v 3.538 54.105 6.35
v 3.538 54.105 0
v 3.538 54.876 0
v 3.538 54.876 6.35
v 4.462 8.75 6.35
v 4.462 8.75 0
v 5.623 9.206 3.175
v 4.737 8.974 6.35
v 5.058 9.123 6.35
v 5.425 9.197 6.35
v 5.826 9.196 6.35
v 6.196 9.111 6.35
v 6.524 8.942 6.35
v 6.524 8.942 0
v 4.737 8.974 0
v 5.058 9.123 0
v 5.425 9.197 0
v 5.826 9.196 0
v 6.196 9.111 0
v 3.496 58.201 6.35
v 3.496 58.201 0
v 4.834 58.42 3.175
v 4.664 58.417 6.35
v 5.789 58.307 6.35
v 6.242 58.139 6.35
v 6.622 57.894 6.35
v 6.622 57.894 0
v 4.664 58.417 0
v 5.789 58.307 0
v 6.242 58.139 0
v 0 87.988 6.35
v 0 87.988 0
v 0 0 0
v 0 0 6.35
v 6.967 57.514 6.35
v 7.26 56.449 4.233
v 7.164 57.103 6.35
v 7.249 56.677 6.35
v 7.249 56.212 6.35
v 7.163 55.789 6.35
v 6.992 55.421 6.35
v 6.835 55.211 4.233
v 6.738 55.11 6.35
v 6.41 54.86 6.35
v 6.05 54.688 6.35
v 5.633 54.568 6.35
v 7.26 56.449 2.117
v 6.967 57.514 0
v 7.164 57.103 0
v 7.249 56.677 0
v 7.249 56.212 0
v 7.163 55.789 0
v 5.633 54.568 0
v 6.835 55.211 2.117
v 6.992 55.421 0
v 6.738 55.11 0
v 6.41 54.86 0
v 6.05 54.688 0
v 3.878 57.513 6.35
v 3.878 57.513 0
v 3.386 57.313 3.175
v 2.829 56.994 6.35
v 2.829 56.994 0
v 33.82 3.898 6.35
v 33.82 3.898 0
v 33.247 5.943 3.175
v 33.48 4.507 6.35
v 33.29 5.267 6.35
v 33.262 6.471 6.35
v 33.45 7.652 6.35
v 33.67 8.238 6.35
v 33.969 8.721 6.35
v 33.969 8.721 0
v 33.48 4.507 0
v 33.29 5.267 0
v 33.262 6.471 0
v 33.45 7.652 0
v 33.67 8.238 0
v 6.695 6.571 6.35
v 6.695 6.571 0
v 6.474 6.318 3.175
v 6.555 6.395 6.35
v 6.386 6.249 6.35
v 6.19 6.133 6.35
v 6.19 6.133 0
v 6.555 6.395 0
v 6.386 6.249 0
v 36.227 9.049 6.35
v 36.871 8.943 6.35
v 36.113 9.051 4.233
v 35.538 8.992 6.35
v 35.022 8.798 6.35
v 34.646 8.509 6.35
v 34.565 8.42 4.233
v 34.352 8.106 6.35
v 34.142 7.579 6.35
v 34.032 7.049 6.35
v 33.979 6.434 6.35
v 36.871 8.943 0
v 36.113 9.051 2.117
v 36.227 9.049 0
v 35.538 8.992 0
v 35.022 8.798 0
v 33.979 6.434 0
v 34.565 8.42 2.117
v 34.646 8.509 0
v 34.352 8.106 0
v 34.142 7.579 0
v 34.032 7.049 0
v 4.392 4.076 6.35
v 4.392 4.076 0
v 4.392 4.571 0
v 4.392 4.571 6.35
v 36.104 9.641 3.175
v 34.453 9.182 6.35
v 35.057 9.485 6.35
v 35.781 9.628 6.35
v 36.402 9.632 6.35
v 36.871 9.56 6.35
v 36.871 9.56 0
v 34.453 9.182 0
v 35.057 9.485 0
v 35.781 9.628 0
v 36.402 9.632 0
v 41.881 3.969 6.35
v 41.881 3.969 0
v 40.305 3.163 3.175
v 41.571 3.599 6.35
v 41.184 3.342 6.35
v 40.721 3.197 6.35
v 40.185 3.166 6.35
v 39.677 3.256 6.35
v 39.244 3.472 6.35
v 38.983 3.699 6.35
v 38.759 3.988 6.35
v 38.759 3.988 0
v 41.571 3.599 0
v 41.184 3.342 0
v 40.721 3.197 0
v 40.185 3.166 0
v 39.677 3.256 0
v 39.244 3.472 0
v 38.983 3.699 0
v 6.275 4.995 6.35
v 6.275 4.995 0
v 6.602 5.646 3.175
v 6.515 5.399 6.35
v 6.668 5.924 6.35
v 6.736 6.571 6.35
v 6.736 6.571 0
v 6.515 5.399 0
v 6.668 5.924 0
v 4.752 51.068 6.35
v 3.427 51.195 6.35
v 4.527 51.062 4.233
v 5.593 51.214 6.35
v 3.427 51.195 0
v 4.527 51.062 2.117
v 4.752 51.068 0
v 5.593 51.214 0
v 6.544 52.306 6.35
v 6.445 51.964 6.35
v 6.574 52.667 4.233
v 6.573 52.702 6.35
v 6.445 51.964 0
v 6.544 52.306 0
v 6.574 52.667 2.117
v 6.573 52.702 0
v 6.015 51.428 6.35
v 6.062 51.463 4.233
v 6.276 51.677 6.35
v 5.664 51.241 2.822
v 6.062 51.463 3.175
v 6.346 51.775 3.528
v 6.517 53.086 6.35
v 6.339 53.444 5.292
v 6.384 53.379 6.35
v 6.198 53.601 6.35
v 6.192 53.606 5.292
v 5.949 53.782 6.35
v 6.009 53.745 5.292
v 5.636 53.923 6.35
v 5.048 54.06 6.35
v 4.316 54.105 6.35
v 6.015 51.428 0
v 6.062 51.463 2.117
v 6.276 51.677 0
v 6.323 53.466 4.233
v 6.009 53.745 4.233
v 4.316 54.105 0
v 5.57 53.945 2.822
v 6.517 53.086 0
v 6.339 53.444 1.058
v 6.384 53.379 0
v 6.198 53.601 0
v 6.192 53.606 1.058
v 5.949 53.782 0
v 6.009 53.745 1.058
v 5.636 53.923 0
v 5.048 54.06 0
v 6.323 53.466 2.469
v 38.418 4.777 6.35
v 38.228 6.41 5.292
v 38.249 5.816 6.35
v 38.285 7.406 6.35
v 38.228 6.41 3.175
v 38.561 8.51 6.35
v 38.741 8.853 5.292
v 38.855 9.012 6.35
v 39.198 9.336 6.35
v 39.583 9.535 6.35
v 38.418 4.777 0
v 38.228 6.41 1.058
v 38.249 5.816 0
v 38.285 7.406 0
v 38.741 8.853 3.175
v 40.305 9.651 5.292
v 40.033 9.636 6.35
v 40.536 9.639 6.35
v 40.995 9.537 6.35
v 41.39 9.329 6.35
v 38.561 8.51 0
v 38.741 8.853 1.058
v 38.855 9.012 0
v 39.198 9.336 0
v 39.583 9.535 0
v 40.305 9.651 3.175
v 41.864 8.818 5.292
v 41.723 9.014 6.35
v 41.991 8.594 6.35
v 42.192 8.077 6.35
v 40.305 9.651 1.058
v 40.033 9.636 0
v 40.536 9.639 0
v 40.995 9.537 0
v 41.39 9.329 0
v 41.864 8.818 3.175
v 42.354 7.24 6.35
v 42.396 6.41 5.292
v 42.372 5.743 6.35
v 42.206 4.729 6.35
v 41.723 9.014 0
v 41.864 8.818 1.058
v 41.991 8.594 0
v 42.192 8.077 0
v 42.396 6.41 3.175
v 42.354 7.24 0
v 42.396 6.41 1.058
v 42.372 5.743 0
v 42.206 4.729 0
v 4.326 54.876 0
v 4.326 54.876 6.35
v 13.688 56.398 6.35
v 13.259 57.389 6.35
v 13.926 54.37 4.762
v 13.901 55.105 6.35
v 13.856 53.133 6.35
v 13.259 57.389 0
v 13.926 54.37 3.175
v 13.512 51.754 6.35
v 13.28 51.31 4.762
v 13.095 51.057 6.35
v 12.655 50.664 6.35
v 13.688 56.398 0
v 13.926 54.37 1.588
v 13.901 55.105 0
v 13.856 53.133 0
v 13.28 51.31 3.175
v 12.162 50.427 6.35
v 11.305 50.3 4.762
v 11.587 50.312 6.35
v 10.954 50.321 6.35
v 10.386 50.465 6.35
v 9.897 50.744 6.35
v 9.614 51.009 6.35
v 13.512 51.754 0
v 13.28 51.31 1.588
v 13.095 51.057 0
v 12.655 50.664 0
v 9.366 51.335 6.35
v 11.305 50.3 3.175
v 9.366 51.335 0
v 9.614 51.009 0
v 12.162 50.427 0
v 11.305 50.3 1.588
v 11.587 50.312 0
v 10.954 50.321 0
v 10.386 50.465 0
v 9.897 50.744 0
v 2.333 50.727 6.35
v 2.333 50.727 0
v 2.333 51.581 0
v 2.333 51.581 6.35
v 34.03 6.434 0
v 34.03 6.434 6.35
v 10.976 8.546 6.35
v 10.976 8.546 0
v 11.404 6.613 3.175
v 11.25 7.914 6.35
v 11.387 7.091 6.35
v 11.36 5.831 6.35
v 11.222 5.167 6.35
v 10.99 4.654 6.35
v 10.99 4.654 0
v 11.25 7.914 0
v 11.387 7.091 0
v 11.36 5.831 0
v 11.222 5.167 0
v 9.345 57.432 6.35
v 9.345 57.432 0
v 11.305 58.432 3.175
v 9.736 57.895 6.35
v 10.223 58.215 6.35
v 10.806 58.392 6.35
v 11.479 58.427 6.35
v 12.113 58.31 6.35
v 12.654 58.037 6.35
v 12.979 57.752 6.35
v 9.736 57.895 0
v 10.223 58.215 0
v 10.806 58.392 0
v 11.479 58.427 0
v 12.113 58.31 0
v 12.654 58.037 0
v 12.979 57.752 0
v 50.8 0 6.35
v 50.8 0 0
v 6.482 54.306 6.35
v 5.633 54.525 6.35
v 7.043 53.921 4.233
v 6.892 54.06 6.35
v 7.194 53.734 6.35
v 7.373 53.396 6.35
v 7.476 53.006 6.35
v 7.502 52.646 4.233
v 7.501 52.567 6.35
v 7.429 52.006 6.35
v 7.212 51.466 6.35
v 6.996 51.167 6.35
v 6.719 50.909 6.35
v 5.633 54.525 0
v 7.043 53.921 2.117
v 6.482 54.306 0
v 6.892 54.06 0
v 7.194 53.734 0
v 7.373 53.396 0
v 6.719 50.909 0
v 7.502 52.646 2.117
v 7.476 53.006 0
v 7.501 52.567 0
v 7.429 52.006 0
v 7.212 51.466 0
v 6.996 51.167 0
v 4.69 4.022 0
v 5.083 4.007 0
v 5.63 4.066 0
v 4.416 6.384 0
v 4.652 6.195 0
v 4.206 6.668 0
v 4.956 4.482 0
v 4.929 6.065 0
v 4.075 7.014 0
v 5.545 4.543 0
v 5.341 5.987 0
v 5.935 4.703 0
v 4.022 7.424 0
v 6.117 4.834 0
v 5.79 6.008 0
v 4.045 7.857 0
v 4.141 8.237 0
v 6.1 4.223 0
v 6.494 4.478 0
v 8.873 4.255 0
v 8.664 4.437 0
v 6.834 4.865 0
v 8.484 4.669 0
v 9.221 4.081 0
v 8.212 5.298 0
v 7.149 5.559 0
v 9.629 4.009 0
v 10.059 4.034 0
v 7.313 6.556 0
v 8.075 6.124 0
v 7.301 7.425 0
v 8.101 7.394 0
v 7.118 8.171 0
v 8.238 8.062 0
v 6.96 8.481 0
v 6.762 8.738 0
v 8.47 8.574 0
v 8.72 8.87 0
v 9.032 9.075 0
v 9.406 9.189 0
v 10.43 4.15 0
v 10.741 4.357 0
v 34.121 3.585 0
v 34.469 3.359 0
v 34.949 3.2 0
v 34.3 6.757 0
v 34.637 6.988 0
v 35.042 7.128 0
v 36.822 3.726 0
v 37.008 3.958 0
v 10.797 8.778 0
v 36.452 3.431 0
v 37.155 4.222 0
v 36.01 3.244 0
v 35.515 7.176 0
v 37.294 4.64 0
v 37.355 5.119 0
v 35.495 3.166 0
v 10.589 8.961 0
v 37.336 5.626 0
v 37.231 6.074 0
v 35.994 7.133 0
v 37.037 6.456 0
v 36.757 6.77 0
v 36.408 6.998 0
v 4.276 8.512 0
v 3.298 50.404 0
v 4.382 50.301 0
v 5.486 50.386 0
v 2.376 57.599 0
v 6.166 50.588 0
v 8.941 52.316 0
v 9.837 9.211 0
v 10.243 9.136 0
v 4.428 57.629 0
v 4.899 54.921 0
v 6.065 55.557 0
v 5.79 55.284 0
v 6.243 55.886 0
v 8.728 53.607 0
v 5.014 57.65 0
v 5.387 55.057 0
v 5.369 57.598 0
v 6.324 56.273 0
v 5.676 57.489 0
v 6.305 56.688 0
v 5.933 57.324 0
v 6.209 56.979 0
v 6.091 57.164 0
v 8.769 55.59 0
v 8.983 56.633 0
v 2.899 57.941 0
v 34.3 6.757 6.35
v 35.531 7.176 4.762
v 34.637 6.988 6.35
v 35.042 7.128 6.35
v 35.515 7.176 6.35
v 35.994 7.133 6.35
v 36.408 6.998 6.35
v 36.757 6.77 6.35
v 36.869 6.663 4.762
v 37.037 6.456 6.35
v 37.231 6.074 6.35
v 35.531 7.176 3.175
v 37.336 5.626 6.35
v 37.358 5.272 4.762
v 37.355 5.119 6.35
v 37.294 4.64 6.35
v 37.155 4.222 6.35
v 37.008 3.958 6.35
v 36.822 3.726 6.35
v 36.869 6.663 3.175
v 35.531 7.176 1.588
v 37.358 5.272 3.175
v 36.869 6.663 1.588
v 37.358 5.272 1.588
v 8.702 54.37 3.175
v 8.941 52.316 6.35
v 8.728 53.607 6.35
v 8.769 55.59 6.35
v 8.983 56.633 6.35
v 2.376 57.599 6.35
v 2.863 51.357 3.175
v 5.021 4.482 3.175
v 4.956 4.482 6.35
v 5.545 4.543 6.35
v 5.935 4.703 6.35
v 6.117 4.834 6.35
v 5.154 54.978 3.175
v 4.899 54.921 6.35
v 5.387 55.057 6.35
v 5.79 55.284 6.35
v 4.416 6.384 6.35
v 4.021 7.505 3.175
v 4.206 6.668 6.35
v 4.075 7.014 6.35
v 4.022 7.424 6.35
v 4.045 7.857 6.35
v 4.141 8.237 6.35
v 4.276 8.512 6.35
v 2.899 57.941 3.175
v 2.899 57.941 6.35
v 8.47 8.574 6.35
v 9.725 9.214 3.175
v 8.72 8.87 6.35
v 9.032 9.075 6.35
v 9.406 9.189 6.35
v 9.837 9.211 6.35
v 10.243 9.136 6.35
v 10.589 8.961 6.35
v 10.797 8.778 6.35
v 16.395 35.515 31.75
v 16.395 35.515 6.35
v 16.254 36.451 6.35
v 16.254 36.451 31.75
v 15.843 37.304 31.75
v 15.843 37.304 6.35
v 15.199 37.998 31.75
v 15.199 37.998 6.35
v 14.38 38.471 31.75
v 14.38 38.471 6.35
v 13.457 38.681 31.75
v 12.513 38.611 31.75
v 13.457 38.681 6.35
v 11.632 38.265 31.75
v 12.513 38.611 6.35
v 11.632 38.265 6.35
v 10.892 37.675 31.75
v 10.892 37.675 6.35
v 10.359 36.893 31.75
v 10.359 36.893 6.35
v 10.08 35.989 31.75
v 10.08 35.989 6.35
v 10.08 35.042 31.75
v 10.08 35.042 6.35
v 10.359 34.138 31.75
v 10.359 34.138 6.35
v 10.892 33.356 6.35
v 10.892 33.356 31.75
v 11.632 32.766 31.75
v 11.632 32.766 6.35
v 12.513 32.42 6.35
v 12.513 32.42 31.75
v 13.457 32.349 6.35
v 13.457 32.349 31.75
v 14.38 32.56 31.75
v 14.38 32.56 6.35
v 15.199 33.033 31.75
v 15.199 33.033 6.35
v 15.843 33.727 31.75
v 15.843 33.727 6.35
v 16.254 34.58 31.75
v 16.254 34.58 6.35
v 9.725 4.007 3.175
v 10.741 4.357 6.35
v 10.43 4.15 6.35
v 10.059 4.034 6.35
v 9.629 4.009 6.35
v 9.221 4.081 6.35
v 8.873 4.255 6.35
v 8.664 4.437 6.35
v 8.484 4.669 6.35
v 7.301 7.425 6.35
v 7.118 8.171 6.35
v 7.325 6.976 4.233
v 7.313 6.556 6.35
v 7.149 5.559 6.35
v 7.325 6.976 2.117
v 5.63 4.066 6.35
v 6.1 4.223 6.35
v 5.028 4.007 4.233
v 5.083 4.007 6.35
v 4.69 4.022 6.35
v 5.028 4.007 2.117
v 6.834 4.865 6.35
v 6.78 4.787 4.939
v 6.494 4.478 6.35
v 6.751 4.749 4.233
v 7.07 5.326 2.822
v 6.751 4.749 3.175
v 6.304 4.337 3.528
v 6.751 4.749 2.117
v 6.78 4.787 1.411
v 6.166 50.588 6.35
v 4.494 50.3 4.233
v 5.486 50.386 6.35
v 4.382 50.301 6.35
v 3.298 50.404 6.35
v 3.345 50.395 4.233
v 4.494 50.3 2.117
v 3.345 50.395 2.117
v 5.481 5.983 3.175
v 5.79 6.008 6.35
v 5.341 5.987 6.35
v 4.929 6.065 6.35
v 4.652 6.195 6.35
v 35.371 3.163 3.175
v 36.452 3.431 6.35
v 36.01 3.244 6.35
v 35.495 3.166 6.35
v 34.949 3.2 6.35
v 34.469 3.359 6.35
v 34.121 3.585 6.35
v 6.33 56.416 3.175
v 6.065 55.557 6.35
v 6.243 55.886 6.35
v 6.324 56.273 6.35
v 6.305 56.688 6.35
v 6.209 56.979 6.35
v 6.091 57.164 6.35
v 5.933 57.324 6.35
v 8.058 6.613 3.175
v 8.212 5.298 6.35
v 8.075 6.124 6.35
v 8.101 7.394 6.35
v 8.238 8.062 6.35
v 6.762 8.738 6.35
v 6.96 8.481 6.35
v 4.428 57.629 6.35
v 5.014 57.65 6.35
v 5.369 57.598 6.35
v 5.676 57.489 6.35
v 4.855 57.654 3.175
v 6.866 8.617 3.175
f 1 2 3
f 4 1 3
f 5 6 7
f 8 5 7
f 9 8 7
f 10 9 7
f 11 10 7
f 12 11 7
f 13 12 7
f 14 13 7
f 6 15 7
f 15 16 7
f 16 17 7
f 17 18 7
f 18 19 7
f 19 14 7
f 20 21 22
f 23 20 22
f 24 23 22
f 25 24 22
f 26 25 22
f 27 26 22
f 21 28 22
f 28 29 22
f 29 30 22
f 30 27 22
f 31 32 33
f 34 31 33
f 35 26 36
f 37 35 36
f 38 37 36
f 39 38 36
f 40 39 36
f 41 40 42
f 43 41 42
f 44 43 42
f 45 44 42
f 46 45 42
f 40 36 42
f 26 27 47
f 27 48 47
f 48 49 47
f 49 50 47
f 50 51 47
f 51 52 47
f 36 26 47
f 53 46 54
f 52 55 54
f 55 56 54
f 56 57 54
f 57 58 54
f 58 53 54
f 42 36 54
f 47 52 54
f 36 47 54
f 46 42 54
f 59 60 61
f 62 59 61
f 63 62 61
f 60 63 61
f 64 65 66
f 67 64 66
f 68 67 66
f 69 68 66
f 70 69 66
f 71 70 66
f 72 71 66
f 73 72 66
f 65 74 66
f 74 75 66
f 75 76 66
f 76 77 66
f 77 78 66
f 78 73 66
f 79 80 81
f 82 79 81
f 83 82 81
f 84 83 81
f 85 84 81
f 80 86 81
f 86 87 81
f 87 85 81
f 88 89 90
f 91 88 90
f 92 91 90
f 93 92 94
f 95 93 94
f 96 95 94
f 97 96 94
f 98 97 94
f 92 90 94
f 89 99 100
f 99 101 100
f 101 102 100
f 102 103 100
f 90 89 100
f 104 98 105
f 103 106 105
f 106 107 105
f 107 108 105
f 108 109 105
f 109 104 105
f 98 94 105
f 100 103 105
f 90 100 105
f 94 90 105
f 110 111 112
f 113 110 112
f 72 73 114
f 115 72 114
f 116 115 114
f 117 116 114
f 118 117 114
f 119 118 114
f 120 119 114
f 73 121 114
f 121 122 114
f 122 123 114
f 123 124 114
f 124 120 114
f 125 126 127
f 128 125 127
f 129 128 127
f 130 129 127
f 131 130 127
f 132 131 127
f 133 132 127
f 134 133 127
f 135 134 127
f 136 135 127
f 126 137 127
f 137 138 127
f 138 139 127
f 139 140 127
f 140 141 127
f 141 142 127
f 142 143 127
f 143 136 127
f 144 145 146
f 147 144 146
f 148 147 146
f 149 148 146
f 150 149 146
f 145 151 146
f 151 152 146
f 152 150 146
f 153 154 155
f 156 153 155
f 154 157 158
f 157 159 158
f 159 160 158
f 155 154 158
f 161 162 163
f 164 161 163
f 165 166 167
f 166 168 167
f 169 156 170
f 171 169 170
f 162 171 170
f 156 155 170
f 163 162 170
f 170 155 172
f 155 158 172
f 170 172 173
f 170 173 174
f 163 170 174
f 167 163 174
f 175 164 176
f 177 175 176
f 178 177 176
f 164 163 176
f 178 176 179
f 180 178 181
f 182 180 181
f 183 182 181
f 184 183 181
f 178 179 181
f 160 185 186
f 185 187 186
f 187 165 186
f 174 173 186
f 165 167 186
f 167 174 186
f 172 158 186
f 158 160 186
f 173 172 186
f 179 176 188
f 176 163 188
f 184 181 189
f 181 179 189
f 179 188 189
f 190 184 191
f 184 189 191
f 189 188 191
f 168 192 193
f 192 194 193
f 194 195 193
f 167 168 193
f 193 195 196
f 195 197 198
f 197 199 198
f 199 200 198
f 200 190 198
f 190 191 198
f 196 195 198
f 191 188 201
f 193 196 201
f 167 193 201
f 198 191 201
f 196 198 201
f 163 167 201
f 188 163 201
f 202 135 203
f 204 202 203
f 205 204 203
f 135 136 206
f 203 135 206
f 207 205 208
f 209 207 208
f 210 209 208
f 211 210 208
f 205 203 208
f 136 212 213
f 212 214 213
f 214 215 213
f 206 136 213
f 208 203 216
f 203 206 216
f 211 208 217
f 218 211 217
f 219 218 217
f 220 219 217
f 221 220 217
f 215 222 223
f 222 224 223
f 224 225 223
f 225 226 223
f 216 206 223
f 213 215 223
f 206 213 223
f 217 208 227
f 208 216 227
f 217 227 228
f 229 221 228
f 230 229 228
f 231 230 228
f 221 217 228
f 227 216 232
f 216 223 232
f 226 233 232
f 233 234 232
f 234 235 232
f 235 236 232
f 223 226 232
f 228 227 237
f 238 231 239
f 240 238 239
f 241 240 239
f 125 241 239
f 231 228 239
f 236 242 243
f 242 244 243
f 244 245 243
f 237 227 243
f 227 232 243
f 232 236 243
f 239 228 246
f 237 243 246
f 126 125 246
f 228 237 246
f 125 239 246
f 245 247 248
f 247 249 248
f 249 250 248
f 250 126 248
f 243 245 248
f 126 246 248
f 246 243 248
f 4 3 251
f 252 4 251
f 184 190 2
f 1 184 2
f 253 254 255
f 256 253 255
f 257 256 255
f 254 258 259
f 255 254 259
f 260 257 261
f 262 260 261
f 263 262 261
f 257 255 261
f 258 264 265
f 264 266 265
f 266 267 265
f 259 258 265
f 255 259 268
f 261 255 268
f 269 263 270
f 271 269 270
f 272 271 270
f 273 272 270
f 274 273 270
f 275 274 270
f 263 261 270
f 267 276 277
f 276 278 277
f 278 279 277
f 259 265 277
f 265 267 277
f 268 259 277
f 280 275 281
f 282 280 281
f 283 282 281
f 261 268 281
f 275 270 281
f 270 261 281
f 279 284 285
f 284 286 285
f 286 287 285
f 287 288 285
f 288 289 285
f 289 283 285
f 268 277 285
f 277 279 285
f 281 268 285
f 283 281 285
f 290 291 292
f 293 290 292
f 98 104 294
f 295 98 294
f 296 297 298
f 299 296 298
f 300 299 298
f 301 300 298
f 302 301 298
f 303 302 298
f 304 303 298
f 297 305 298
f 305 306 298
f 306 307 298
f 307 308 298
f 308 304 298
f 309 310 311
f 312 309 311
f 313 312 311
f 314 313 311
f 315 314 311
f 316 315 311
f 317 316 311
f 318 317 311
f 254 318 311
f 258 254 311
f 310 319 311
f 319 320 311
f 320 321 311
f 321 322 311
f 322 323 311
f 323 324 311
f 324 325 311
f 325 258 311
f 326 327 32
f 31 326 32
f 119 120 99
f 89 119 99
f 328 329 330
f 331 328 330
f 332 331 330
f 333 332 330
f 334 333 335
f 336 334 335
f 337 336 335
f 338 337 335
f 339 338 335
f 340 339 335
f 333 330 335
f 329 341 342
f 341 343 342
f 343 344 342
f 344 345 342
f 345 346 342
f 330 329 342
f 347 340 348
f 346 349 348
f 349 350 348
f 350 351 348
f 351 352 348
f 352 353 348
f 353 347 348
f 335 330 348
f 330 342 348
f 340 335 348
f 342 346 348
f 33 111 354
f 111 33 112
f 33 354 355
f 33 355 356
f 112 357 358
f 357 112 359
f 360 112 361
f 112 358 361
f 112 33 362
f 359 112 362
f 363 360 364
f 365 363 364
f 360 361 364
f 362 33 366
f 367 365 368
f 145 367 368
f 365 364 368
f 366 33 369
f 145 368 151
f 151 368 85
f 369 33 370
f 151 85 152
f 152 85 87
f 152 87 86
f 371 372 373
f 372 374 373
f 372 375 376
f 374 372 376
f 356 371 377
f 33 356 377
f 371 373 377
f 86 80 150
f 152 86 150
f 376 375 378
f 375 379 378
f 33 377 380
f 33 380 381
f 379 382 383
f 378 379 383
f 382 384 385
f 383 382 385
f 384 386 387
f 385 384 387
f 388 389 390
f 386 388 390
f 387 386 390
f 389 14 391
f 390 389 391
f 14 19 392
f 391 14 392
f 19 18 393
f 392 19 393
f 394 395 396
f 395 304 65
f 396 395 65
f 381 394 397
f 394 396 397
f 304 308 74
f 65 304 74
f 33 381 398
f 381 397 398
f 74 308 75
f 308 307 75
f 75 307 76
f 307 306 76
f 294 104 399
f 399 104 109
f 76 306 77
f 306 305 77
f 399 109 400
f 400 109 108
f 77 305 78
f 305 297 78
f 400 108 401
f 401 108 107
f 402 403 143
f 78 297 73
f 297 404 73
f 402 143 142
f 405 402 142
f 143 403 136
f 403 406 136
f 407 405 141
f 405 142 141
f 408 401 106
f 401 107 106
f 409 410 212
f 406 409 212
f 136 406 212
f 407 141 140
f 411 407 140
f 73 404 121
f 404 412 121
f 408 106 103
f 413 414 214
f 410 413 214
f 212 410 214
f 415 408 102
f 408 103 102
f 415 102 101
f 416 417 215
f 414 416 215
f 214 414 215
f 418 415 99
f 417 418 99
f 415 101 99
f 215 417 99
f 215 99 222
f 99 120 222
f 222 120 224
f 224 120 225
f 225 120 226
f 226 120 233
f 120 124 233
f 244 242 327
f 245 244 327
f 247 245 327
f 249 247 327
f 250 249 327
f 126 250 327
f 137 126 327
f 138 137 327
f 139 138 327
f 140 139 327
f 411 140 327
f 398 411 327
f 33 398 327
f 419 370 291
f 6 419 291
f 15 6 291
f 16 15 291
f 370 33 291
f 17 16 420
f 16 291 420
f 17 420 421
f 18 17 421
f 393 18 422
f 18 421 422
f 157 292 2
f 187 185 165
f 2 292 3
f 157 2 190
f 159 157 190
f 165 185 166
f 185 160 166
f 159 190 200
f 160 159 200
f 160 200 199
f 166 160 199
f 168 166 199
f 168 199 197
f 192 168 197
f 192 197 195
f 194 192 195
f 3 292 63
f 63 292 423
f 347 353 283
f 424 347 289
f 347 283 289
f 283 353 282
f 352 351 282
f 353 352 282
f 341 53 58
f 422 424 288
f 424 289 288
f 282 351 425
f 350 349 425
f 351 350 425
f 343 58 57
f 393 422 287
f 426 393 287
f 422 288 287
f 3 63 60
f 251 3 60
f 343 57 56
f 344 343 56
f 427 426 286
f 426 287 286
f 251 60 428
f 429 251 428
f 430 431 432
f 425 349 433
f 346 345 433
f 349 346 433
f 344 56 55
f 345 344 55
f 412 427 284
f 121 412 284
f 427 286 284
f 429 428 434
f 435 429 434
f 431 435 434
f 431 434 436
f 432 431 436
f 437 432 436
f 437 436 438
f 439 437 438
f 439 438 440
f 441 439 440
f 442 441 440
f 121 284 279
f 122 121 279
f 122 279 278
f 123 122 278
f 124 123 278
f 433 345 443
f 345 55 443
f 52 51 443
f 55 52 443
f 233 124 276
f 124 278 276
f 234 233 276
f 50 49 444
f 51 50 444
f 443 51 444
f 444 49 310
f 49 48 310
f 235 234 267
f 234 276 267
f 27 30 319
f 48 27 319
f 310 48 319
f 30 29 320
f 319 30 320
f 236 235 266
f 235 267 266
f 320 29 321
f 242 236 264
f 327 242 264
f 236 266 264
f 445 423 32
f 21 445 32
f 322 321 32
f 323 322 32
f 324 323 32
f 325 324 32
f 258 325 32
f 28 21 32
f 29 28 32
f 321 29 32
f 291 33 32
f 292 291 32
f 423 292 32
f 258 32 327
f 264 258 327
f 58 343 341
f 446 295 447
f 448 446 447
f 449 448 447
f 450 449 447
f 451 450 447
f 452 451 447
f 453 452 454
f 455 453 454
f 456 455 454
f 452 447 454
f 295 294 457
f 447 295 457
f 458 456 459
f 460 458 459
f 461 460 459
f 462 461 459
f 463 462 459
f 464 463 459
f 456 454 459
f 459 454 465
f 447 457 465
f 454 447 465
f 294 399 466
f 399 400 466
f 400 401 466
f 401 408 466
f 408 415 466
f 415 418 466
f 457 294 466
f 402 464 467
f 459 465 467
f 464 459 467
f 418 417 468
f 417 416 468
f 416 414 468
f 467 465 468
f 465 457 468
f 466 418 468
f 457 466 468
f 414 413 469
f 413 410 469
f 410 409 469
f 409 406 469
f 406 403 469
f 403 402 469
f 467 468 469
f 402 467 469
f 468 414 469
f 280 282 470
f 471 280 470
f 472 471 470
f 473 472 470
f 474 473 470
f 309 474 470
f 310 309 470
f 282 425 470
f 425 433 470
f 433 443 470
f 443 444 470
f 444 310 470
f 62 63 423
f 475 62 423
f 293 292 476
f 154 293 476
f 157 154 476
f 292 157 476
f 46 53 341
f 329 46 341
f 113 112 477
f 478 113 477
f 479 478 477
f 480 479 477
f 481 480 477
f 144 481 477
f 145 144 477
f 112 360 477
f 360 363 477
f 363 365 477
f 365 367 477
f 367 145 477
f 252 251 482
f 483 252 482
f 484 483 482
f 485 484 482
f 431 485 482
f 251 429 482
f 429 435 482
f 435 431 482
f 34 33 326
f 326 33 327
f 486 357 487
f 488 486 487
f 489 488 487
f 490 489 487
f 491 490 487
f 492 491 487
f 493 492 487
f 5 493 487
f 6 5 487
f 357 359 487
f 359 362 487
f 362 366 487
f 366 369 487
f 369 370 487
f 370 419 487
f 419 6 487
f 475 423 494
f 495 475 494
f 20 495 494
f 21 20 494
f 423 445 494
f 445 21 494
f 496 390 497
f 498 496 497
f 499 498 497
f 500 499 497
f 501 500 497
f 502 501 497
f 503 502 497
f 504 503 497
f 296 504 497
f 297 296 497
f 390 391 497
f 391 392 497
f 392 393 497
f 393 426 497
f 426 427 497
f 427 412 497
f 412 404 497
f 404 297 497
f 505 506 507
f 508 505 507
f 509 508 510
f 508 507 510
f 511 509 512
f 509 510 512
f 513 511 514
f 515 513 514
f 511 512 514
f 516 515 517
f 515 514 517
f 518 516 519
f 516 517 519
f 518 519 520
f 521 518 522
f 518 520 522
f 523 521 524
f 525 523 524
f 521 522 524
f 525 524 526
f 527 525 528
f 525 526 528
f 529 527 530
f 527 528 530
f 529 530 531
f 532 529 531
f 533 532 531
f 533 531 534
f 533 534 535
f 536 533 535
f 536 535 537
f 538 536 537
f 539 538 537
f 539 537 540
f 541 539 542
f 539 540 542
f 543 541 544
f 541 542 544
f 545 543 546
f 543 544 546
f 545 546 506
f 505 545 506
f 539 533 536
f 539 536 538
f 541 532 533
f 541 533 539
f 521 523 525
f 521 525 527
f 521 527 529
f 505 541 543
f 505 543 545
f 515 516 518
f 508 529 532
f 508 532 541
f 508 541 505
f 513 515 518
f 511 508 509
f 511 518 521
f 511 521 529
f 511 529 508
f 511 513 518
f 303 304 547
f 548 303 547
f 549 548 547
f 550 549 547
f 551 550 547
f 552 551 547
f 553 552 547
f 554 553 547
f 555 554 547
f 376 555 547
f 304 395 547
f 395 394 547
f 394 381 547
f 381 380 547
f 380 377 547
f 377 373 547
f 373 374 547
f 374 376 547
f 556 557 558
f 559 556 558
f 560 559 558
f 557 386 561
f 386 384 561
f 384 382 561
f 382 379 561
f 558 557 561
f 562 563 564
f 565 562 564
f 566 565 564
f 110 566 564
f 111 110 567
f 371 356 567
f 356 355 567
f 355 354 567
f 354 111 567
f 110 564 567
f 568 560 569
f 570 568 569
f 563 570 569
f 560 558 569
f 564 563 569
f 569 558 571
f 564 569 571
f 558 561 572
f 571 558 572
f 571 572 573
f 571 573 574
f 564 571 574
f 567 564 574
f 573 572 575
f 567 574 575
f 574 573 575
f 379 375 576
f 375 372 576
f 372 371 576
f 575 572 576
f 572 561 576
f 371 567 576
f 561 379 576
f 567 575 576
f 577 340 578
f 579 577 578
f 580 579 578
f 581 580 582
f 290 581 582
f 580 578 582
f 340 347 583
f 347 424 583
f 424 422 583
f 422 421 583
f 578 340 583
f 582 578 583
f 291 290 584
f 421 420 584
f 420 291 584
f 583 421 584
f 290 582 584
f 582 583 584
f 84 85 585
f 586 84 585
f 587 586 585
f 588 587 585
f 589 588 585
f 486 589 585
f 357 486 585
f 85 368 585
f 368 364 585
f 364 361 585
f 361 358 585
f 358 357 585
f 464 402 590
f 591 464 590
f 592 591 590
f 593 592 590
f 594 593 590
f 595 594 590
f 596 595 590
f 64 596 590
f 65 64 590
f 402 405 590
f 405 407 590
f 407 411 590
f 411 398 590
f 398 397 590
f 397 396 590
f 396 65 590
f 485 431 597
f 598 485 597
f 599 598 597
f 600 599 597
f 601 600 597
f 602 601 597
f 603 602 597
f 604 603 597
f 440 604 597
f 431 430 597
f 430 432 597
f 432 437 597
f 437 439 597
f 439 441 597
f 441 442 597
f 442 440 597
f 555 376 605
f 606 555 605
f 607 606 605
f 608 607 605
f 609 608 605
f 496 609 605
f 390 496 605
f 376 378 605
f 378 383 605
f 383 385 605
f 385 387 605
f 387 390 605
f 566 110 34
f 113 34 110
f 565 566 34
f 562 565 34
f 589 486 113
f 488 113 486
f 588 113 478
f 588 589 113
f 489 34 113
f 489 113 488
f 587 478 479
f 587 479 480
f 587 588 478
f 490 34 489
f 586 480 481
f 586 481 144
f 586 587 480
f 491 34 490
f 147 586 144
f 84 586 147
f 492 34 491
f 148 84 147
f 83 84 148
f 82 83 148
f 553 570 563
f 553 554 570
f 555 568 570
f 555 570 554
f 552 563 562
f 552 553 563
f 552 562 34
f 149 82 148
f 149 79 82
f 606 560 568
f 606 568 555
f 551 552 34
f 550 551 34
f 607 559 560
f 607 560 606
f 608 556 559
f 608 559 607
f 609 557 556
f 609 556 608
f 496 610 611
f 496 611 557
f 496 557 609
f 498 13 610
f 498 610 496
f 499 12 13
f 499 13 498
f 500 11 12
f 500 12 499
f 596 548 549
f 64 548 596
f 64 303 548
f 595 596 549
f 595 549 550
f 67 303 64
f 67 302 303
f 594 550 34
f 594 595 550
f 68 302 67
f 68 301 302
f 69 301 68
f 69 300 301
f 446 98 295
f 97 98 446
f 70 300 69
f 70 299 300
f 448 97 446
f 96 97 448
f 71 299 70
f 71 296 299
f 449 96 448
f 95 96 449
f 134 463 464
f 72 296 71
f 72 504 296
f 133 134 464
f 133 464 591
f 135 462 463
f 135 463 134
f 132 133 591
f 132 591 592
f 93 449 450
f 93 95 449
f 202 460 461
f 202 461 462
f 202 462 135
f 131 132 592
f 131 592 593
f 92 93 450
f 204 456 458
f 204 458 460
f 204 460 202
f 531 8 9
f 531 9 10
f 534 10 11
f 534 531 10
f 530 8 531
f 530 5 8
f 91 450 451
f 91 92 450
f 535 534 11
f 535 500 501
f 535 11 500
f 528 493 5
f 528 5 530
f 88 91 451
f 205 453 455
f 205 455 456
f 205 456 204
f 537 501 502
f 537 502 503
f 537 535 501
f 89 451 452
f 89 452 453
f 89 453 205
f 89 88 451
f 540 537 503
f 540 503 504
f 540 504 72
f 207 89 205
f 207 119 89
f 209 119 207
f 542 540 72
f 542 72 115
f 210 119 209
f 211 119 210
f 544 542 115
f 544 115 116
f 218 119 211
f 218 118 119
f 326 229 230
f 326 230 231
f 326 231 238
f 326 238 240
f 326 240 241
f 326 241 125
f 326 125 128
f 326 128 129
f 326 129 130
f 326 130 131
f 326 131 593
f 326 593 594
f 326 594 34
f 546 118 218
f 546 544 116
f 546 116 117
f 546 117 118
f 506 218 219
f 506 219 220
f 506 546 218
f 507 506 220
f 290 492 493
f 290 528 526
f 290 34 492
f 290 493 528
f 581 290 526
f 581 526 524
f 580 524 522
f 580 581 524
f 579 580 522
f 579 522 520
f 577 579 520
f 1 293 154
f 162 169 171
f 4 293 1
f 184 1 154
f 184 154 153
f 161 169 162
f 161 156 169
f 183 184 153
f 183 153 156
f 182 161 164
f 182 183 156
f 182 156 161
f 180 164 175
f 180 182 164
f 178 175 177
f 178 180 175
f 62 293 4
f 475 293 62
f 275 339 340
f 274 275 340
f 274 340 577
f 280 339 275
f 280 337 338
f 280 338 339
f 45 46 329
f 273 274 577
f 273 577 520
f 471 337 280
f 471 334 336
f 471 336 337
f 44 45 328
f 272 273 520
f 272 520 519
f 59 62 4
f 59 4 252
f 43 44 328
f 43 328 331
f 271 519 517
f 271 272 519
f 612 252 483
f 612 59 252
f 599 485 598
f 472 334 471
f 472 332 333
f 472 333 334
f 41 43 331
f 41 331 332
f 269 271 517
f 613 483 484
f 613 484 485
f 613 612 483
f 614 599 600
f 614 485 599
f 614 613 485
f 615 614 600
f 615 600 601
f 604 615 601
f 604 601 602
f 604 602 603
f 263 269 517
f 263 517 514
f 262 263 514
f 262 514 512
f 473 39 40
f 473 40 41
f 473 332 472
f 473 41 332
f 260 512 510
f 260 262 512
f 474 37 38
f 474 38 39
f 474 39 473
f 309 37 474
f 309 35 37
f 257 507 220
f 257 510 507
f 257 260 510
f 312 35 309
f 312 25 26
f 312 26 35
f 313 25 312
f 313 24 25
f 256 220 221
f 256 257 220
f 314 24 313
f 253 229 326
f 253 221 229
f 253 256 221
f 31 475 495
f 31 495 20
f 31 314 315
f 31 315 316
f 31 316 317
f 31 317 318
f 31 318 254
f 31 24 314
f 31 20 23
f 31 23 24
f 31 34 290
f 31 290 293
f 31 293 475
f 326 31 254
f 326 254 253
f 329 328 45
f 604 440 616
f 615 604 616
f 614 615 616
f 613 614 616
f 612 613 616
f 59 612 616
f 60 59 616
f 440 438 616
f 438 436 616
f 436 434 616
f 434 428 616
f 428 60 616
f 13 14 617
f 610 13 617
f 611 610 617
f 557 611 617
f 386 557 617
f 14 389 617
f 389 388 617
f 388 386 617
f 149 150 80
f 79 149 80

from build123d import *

# Parameters (mm, degrees)
F1_DEPTH = 6.35
F2_R     = 3.175
F3_DEPTH = 25.4


with BuildPart() as f1:
    # F0 (on Top) → F1 (new body)
    with BuildSketch(Plane.XY):
        Polygon((0, 87.9881810245), (0, 0), (50.8, 0), align=None)
        with BuildLine():
            add(Edge.make_bspline(
                [(7.1177864202, 8.1707244078), (7.3253515095, 7.66426559), (7.3253515095, 6.9757030005)],
                knots=[0, 0, 0, 1, 1, 1], degree=2))
            add(Edge.make_bspline(
                [(7.3253515095, 6.9757030005), (7.3253515095, 4.0066919637), (5.028297855, 4.0066919637)],
                knots=[0, 0, 0, 1, 1, 1], degree=2))
            add(Edge.make_bspline(
                [(5.028297855, 4.0066919637), (4.6264518421, 4.0066919637), (4.3917649145, 4.0764338337)],
                knots=[0, 0, 0, 1, 1, 1], degree=2))
            Line((4.3917649145, 4.0764338337), (4.3917649145, 4.5712690065))
            add(Edge.make_bspline(
                [(4.3917649145, 4.5712690065), (4.6685183669, 4.4816008879), (5.0205487583, 4.4816008879)],
                knots=[0, 0, 0, 1, 1, 1], degree=2))
            add(Edge.make_bspline(
                [(5.0205487583, 4.4816008879), (5.8508091153, 4.4816008879), (6.2747954044, 4.9952552955)],
                knots=[0, 0, 0, 1, 1, 1], degree=2))
            add(Edge.make_bspline(
                [(6.2747954044, 4.9952552955), (6.6987816934, 5.5089097031), (6.7364201629, 6.5705359463)],
                knots=[0, 0, 0, 1, 1, 1], degree=2))
            Line((6.7364201629, 6.5705359463), (6.6954606519, 6.5705359463))
            add(Edge.make_bspline(
                [(6.6954606519, 6.5705359463), (6.5050542767, 6.2838193697), (6.1901088479, 6.1332654916)],
                knots=[0, 0, 0, 1, 1, 1], degree=2))
            add(Edge.make_bspline(
                [(6.1901088479, 6.1332654916), (5.8751634192, 5.9827116135), (5.481066503, 5.9827116135)],
                knots=[0, 0, 0, 1, 1, 1], degree=2))
            add(Edge.make_bspline(
                [(5.481066503, 5.9827116135), (4.8102161345, 5.9827116135), (4.4155657114, 6.3840041194)],
                knots=[0, 0, 0, 1, 1, 1], degree=2))
            add(Edge.make_bspline(
                [(4.4155657114, 6.3840041194), (4.0209152884, 6.7852966253), (4.0209152884, 7.5048556014)],
                knots=[0, 0, 0, 1, 1, 1], degree=2))
            add(Edge.make_bspline(
                [(4.0209152884, 7.5048556014), (4.0209152884, 8.2930494337), (4.4620602914, 8.7496926301)],
                knots=[0, 0, 0, 1, 1, 1], degree=2))
            add(Edge.make_bspline(
                [(4.4620602914, 8.7496926301), (4.9032052945, 9.2063358265), (5.6227642706, 9.2063358265)],
                knots=[0, 0, 0, 1, 1, 1], degree=2))
            add(Edge.make_bspline(
                [(5.6227642706, 9.2063358265), (6.1386327058, 9.2063358265), (6.5244270184, 8.941759526)],
                knots=[0, 0, 0, 1, 1, 1], degree=2))
            add(Edge.make_bspline(
                [(6.5244270184, 8.941759526), (6.910221331, 8.6771832256), (7.1177864202, 8.1707244078)],
                knots=[0, 0, 0, 1, 1, 1], degree=2))
        make_face(mode=Mode.SUBTRACT)
        with BuildLine():
            add(Edge.make_bspline(
                [(10.9762830529, 8.5460020892), (11.4035903834, 7.8779192552), (11.4035903834, 6.612602471)],
                knots=[0, 0, 0, 1, 1, 1], degree=2))
            add(Edge.make_bspline(
                [(11.4035903834, 6.612602471), (11.4035903834, 5.3007911069), (10.9901207255, 4.6537415353)],
                knots=[0, 0, 0, 1, 1, 1], degree=2))
            add(Edge.make_bspline(
                [(10.9901207255, 4.6537415353), (10.5766510677, 4.0066919637), (9.7253574483, 4.0066919637)],
                knots=[0, 0, 0, 1, 1, 1], degree=2))
            add(Edge.make_bspline(
                [(9.7253574483, 4.0066919637), (8.9094882707, 4.0066919637), (8.483841461, 4.6692397286)],
                knots=[0, 0, 0, 1, 1, 1], degree=2))
            add(Edge.make_bspline(
                [(8.483841461, 4.6692397286), (8.0581946513, 5.3317874936), (8.0581946513, 6.612602471)],
                knots=[0, 0, 0, 1, 1, 1], degree=2))
            add(Edge.make_bspline(
                [(8.0581946513, 6.612602471), (8.0581946513, 7.9332699457), (8.4700037884, 8.5736774344)],
                knots=[0, 0, 0, 1, 1, 1], degree=2))
            add(Edge.make_bspline(
                [(8.4700037884, 8.5736774344), (8.8818129255, 9.2140849232), (9.7253574483, 9.2140849232)],
                knots=[0, 0, 0, 1, 1, 1], degree=2))
            add(Edge.make_bspline(
                [(9.7253574483, 9.2140849232), (10.5489757225, 9.2140849232), (10.9762830529, 8.5460020892)],
                knots=[0, 0, 0, 1, 1, 1], degree=2))
        make_face(mode=Mode.SUBTRACT)
        with BuildLine():
            add(Edge.make_bspline(
                [(33.8198292579, 3.8980552581), (33.2467805147, 4.6331574968), (33.2467805147, 5.9433772467)],
                knots=[0, 0, 0, 1, 1, 1], degree=2))
            add(Edge.make_bspline(
                [(33.2467805147, 5.9433772467), (33.2467805147, 7.8011309342), (33.9687805558, 8.7210431166)],
                knots=[0, 0, 0, 1, 1, 1], degree=2))
            add(Edge.make_bspline(
                [(33.9687805558, 8.7210431166), (34.690780597, 9.6409552989), (36.1044387482, 9.6409552989)],
                knots=[0, 0, 0, 1, 1, 1], degree=2))
            add(Edge.make_bspline(
                [(36.1044387482, 9.6409552989), (36.5912888237, 9.6409552989), (36.8712620966, 9.5595837565)],
                knots=[0, 0, 0, 1, 1, 1], degree=2))
            Line((36.8712620966, 9.5595837565), (36.8712620966, 8.9430908847))
            add(Edge.make_bspline(
                [(36.8712620966, 8.9430908847), (36.5388800337, 9.0506668221), (36.1127138203, 9.0506668221)],
                knots=[0, 0, 0, 1, 1, 1], degree=2))
            add(Edge.make_bspline(
                [(36.1127138203, 9.0506668221), (35.0990174875, 9.0506668221), (34.5645857474, 8.4196925741)],
                knots=[0, 0, 0, 1, 1, 1], degree=2))
            add(Edge.make_bspline(
                [(34.5645857474, 8.4196925741), (34.0301540073, 7.7887183261), (33.979124396, 6.4343648583)],
                knots=[0, 0, 0, 1, 1, 1], degree=2))
            Line((33.979124396, 6.4343648583), (34.0301540073, 6.4343648583))
            add(Edge.make_bspline(
                [(34.0301540073, 6.4343648583), (34.5045914746, 7.1763629903), (35.5307004156, 7.1763629903)],
                knots=[0, 0, 0, 1, 1, 1], degree=2))
            add(Edge.make_bspline(
                [(35.5307004156, 7.1763629903), (36.3802744851, 7.1763629903), (36.8691933286, 6.6633085198)],
                knots=[0, 0, 0, 1, 1, 1], degree=2))
            add(Edge.make_bspline(
                [(36.8691933286, 6.6633085198), (37.3581121721, 6.1502540493), (37.3581121721, 5.2717172275)],
                knots=[0, 0, 0, 1, 1, 1], degree=2))
            add(Edge.make_bspline(
                [(37.3581121721, 5.2717172275), (37.3581121721, 4.2883628257), (36.821611664, 3.7256579226)],
                knots=[0, 0, 0, 1, 1, 1], degree=2))
            add(Edge.make_bspline(
                [(36.821611664, 3.7256579226), (36.2851111558, 3.1629530195), (35.3707156883, 3.1629530195)],
                knots=[0, 0, 0, 1, 1, 1], degree=2))
            add(Edge.make_bspline(
                [(35.3707156883, 3.1629530195), (34.3928780012, 3.1629530195), (33.8198292579, 3.8980552581)],
                knots=[0, 0, 0, 1, 1, 1], degree=2))
        make_face(mode=Mode.SUBTRACT)
        with BuildLine():
            add(Edge.make_bspline(
                [(41.8638889332, 8.8182752138), (42.3962519053, 7.9859408779), (42.3962519053, 6.4095396419)],
                knots=[0, 0, 0, 1, 1, 1], degree=2))
            add(Edge.make_bspline(
                [(42.3962519053, 6.4095396419), (42.3962519053, 4.7752129012), (41.8811286668, 3.9690829603)],
                knots=[0, 0, 0, 1, 1, 1], degree=2))
            add(Edge.make_bspline(
                [(41.8811286668, 3.9690829603), (41.3660054282, 3.1629530195), (40.3054170201, 3.1629530195)],
                knots=[0, 0, 0, 1, 1, 1], degree=2))
            add(Edge.make_bspline(
                [(40.3054170201, 3.1629530195), (39.2889623299, 3.1629530195), (38.7586681259, 3.9883914619)],
                knots=[0, 0, 0, 1, 1, 1], degree=2))
            add(Edge.make_bspline(
                [(38.7586681259, 3.9883914619), (38.2283739218, 4.8138299044), (38.2283739218, 6.4095396419)],
                knots=[0, 0, 0, 1, 1, 1], degree=2))
            add(Edge.make_bspline(
                [(38.2283739218, 6.4095396419), (38.2283739218, 8.0548998121), (38.7414283923, 8.8527546809)],
                knots=[0, 0, 0, 1, 1, 1], degree=2))
            add(Edge.make_bspline(
                [(38.7414283923, 8.8527546809), (39.2544828628, 9.6506095497), (40.3054170201, 9.6506095497)],
                knots=[0, 0, 0, 1, 1, 1], degree=2))
            add(Edge.make_bspline(
                [(40.3054170201, 9.6506095497), (41.3315259611, 9.6506095497), (41.8638889332, 8.8182752138)],
                knots=[0, 0, 0, 1, 1, 1], degree=2))
        make_face(mode=Mode.SUBTRACT)
        with BuildLine():
            add(Edge.make_bspline(
                [(6.6219470415, 57.8936907057), (7.2598688227, 57.3672755773), (7.2598688227, 56.4492905752)],
                knots=[0, 0, 0, 1, 1, 1], degree=2))
            add(Edge.make_bspline(
                [(7.2598688227, 56.4492905752), (7.2598688227, 55.6920826073), (6.8354520279, 55.2114802898)],
                knots=[0, 0, 0, 1, 1, 1], degree=2))
            add(Edge.make_bspline(
                [(6.8354520279, 55.2114802898), (6.4110352331, 54.7308779723), (5.6330818415, 54.5683721527)],
                knots=[0, 0, 0, 1, 1, 1], degree=2))
            Line((5.6330818415, 54.5683721527), (5.6330818415, 54.5251525198))
            add(Edge.make_bspline(
                [(5.6330818415, 54.5251525198), (6.5839137646, 54.4075951184), (7.0429062657, 53.9209420523)],
                knots=[0, 0, 0, 1, 1, 1], degree=2))
            add(Edge.make_bspline(
                [(7.0429062657, 53.9209420523), (7.5018987668, 53.4342889862), (7.5018987668, 52.6459628826)],
                knots=[0, 0, 0, 1, 1, 1], degree=2))
            add(Edge.make_bspline(
                [(7.5018987668, 52.6459628826), (7.5018987668, 51.517066072), (6.7187590191, 50.9085336412)],
                knots=[0, 0, 0, 1, 1, 1], degree=2))
            add(Edge.make_bspline(
                [(6.7187590191, 50.9085336412), (5.9356192715, 50.3000012104), (4.493812319, 50.3000012104)],
                knots=[0, 0, 0, 1, 1, 1], degree=2))
            add(Edge.make_bspline(
                [(4.493812319, 50.3000012104), (3.8662632497, 50.3000012104), (3.3450344773, 50.3950844027)],
                knots=[0, 0, 0, 1, 1, 1], degree=2))
            add(Edge.make_bspline(
                [(3.3450344773, 50.3950844027), (2.8238057049, 50.490167595), (2.3328306755, 50.7270111832)],
                knots=[0, 0, 0, 1, 1, 1], degree=2))
            Line((2.3328306755, 50.7270111832), (2.3328306755, 51.5810311287))
            add(Edge.make_bspline(
                [(2.3328306755, 51.5810311287), (2.846279914, 51.3268996874), (3.4271517798, 51.1946476108)],
                knots=[0, 0, 0, 1, 1, 1], degree=2))
            add(Edge.make_bspline(
                [(3.4271517798, 51.1946476108), (4.0080236455, 51.0623955342), (4.52665924, 51.0623955342)],
                knots=[0, 0, 0, 1, 1, 1], degree=2))
            add(Edge.make_bspline(
                [(4.52665924, 51.0623955342), (6.5735410527, 51.0623955342), (6.5735410527, 52.6667083064)],
                knots=[0, 0, 0, 1, 1, 1], degree=2))
            add(Edge.make_bspline(
                [(6.5735410527, 52.6667083064), (6.5735410527, 54.1050576883), (4.3157474316, 54.1050576883)],
                knots=[0, 0, 0, 1, 1, 1], degree=2))
            Line((4.3157474316, 54.1050576883), (3.5377940399, 54.1050576883))
            Line((3.5377940399, 54.1050576883), (3.5377940399, 54.8760959387))
            Line((3.5377940399, 54.8760959387), (4.3261201435, 54.8760959387))
            add(Edge.make_bspline(
                [(4.3261201435, 54.8760959387), (5.2492915016, 54.8760959387), (5.7895369124, 55.284089273)],
                knots=[0, 0, 0, 1, 1, 1], degree=2))
            add(Edge.make_bspline(
                [(5.7895369124, 55.284089273), (6.3297823233, 55.6920826073), (6.3297823233, 56.4164436542)],
                knots=[0, 0, 0, 1, 1, 1], degree=2))
            add(Edge.make_bspline(
                [(6.3297823233, 56.4164436542), (6.3297823233, 56.9938579493), (5.9330260936, 57.3240559445)],
                knots=[0, 0, 0, 1, 1, 1], degree=2))
            add(Edge.make_bspline(
                [(5.9330260936, 57.3240559445), (5.5362698638, 57.6542539396), (4.8551284498, 57.6542539396)],
                knots=[0, 0, 0, 1, 1, 1], degree=2))
            add(Edge.make_bspline(
                [(4.8551284498, 57.6542539396), (4.3364928553, 57.6542539396), (3.8775003543, 57.5133579364)],
                knots=[0, 0, 0, 1, 1, 1], degree=2))
            add(Edge.make_bspline(
                [(3.8775003543, 57.5133579364), (3.4185078532, 57.3724619333), (2.8289920608, 56.9938579493)],
                knots=[0, 0, 0, 1, 1, 1], degree=2))
            Line((2.8289920608, 56.9938579493), (2.3760503084, 57.5989328095))
            add(Edge.make_bspline(
                [(2.3760503084, 57.5989328095), (2.8618389818, 57.9827231494), (3.4963031924, 58.2014144917)],
                knots=[0, 0, 0, 1, 1, 1], degree=2))
            add(Edge.make_bspline(
                [(3.4963031924, 58.2014144917), (4.1307674029, 58.4201058341), (4.834383026, 58.4201058341)],
                knots=[0, 0, 0, 1, 1, 1], degree=2))
            add(Edge.make_bspline(
                [(4.834383026, 58.4201058341), (5.9840252604, 58.4201058341), (6.6219470415, 57.8936907057)],
                knots=[0, 0, 0, 1, 1, 1], degree=2))
        make_face(mode=Mode.SUBTRACT)
        with BuildLine():
            add(Edge.make_bspline(
                [(13.2587538651, 57.3888853938), (13.9260649966, 56.3455634563), (13.9260649966, 54.3695618415)],
                knots=[0, 0, 0, 1, 1, 1], degree=2))
            add(Edge.make_bspline(
                [(13.9260649966, 54.3695618415), (13.9260649966, 52.3209512434), (13.2803636815, 51.3104762269)],
                knots=[0, 0, 0, 1, 1, 1], degree=2))
            add(Edge.make_bspline(
                [(13.2803636815, 51.3104762269), (12.6346623664, 50.3000012104), (11.3052264593, 50.3000012104)],
                knots=[0, 0, 0, 1, 1, 1], degree=2))
            add(Edge.make_bspline(
                [(11.3052264593, 50.3000012104), (10.0311116823, 50.3000012104), (9.3663937288, 51.3346792213)],
                knots=[0, 0, 0, 1, 1, 1], degree=2))
            add(Edge.make_bspline(
                [(9.3663937288, 51.3346792213), (8.7016757752, 52.3693572322), (8.7016757752, 54.3695618415)],
                knots=[0, 0, 0, 1, 1, 1], degree=2))
            add(Edge.make_bspline(
                [(8.7016757752, 54.3695618415), (8.7016757752, 56.432002722), (9.3447839123, 57.4321050266)],
                knots=[0, 0, 0, 1, 1, 1], degree=2))
            add(Edge.make_bspline(
                [(9.3447839123, 57.4321050266), (9.9878920494, 58.4322073313), (11.3052264593, 58.4322073313)],
                knots=[0, 0, 0, 1, 1, 1], degree=2))
            add(Edge.make_bspline(
                [(11.3052264593, 58.4322073313), (12.5914427335, 58.4322073313), (13.2587538651, 57.3888853938)],
                knots=[0, 0, 0, 1, 1, 1], degree=2))
        make_face(mode=Mode.SUBTRACT)
    extrude(amount=F1_DEPTH)

    # F2 (on face) → F3 (join)
    with BuildSketch(Plane.XY.offset(6.35)):
        with Locations((13.2195614278, 35.5153493583)):
            Circle(F2_R)
    extrude(amount=F3_DEPTH)


solid = f1.part
